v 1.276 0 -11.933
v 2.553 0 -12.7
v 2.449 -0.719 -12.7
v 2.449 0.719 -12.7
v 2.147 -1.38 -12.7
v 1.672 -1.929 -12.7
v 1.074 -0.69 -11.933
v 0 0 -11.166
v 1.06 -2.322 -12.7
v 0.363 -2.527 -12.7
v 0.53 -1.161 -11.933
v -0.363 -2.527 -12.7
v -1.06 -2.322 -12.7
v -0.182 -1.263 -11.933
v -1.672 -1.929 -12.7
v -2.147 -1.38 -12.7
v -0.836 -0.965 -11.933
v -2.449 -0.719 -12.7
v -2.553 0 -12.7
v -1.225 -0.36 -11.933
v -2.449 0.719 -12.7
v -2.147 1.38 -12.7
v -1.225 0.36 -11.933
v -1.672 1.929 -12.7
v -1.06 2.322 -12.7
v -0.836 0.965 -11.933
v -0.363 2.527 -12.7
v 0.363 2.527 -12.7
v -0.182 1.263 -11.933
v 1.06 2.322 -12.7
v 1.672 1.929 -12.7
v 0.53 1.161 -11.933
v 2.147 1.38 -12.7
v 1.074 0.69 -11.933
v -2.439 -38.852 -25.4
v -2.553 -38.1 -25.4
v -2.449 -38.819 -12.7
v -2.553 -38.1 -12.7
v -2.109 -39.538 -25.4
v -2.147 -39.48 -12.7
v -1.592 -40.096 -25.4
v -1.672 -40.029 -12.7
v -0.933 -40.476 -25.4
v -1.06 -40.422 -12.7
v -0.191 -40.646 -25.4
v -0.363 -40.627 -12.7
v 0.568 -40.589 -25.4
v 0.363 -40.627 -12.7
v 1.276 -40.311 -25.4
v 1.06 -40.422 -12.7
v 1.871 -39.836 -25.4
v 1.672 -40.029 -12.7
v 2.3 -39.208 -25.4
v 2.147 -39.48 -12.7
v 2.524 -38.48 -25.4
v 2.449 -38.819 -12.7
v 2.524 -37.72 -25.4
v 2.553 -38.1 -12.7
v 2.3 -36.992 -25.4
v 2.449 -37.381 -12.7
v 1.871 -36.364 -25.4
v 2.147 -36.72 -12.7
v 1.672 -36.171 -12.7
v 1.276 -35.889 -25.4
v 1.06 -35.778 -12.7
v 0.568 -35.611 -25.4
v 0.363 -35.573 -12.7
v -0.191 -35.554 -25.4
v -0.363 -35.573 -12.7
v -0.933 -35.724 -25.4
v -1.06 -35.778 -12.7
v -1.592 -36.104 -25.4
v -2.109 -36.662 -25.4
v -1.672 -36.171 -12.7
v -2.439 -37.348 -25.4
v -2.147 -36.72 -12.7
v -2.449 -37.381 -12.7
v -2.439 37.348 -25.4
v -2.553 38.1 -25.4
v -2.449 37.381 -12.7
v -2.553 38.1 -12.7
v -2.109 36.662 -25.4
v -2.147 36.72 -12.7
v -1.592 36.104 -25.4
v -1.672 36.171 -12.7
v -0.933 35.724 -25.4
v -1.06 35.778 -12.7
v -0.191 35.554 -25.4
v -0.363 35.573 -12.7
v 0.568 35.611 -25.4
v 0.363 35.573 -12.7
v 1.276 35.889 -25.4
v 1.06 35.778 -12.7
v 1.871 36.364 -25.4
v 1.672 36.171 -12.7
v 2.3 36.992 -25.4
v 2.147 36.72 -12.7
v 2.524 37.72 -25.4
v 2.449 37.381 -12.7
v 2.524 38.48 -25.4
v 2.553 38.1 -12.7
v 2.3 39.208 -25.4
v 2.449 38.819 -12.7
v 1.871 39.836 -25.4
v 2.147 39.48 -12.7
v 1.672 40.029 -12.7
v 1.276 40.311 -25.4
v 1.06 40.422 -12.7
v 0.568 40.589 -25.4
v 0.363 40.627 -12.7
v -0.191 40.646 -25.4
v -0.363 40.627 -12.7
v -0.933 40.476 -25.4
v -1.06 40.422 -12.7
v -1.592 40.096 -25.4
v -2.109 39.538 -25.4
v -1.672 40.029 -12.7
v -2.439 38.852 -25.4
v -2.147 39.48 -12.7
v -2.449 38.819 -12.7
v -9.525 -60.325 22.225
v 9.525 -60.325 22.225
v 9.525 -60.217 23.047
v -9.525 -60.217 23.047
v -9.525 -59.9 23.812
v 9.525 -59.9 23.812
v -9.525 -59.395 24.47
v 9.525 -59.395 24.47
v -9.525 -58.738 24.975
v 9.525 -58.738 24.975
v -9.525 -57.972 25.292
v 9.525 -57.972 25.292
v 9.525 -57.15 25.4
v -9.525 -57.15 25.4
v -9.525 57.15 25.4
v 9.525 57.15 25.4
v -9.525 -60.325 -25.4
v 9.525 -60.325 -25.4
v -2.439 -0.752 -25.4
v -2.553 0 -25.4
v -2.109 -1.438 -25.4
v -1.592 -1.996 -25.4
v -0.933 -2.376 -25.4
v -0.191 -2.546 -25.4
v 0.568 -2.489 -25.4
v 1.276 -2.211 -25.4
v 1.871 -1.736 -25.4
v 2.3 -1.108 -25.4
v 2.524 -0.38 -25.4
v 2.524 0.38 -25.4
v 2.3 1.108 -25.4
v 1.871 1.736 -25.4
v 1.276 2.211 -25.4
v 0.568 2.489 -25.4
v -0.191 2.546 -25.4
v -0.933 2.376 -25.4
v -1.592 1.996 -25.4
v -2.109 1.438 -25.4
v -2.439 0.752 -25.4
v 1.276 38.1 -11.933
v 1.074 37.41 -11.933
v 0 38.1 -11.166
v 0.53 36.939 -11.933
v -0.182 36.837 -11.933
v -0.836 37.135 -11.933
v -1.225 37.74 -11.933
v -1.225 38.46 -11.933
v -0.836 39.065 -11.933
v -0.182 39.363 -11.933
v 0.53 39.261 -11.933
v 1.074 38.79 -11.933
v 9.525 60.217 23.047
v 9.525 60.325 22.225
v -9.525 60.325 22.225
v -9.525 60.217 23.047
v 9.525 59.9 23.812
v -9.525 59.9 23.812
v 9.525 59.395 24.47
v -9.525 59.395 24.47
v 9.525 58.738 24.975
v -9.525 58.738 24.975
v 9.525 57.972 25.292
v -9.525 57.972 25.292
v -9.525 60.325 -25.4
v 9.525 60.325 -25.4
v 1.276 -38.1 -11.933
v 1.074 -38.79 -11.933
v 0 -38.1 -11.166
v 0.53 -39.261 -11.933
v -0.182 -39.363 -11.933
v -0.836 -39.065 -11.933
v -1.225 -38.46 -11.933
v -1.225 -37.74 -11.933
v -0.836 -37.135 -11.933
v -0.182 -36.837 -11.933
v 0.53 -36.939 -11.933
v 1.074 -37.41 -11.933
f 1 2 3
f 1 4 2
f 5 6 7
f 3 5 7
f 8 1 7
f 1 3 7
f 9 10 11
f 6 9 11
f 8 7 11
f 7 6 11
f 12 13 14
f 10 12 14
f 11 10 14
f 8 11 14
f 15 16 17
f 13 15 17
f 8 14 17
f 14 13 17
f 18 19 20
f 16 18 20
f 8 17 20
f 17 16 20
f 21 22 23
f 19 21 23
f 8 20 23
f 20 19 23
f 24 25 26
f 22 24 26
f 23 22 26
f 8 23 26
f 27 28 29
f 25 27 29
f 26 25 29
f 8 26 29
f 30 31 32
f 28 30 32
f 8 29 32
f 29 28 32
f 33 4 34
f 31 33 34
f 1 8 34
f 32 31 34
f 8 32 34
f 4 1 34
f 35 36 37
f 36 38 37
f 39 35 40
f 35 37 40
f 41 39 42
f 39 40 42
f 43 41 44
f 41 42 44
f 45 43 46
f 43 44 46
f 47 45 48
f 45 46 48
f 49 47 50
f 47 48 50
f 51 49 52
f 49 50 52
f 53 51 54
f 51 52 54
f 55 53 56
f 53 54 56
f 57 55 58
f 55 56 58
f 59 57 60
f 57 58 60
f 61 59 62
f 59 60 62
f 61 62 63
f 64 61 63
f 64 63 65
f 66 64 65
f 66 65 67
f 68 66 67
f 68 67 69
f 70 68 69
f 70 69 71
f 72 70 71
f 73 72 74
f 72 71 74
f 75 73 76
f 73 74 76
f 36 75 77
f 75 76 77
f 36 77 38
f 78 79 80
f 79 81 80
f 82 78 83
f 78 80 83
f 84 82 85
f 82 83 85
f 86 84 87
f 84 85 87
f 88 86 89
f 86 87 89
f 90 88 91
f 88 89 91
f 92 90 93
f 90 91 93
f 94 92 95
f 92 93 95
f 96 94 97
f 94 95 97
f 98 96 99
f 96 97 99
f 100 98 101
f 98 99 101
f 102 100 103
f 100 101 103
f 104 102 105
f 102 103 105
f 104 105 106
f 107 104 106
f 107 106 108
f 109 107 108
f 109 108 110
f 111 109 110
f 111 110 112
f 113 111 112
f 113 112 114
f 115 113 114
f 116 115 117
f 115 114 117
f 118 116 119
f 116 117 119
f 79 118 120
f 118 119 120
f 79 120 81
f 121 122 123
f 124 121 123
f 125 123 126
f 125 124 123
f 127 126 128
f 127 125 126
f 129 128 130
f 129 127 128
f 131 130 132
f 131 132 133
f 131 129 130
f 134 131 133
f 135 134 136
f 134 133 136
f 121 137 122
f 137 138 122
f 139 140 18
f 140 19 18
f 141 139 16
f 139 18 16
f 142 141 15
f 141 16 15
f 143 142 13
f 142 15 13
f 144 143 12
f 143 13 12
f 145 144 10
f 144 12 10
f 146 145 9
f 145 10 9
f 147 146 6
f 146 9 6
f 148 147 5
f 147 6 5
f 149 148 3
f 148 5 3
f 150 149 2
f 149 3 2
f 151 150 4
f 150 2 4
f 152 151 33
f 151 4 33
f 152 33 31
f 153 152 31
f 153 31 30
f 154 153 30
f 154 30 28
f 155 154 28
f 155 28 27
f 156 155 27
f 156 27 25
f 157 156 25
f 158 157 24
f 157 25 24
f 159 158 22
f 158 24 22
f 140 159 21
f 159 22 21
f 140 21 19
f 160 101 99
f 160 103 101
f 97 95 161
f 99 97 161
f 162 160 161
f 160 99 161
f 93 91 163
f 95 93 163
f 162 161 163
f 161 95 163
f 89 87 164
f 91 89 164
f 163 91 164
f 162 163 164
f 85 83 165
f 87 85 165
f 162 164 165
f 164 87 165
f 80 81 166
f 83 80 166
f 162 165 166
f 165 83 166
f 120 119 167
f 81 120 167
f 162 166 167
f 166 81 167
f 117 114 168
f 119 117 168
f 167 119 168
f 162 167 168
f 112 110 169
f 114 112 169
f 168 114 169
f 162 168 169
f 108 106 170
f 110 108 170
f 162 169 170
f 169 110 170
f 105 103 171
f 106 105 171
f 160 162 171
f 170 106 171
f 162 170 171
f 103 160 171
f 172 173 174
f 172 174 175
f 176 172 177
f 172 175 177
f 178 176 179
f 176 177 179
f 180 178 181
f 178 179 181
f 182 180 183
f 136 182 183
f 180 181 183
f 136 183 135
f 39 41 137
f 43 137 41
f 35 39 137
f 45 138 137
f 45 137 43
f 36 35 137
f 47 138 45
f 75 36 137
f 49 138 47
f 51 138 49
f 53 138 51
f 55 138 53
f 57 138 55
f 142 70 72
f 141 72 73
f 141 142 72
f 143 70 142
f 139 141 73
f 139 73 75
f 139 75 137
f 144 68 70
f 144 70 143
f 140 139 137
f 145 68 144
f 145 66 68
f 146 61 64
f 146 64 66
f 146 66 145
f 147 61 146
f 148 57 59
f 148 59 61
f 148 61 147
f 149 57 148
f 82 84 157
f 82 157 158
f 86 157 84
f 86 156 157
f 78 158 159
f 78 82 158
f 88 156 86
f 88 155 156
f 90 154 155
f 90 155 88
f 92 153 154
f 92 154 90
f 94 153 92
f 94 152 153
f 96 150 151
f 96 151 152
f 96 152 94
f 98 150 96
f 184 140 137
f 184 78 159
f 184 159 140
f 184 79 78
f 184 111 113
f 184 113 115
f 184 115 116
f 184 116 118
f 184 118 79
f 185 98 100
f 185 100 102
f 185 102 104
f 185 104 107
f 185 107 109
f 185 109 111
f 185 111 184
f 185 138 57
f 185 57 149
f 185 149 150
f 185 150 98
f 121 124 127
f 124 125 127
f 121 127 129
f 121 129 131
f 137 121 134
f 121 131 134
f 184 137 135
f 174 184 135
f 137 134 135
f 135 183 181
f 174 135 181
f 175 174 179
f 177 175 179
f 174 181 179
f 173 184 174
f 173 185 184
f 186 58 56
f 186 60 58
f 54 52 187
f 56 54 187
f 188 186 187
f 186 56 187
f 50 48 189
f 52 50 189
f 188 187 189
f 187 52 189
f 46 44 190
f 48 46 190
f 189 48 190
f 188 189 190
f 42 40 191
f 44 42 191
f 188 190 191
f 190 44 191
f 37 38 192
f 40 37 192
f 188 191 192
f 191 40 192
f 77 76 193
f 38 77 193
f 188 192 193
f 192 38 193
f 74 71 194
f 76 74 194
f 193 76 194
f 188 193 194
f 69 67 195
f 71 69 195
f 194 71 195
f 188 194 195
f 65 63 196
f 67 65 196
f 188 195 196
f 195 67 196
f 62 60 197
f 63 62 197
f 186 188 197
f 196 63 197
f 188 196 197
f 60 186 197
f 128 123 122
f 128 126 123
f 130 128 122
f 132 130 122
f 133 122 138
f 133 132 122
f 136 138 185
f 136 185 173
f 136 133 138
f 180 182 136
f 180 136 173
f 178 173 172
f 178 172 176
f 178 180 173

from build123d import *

# Parameters (mm, degrees)
F0_W     = 120.65
F0_H     = 50.8
F1_DEPTH = 9.525
F2_R     = 3.175
F4_D     = 5.1054
F4_DEPTH = 12.7
F4_TIP   = 1.5338169022


with BuildPart() as f1:
    # F0 (on Right) → F1 (new body, symmetric)
    with BuildSketch(Plane.YZ):
        Rectangle(F0_W, F0_H)
    extrude(amount=F1_DEPTH, both=True)

    # F2
    f2_edges = [f1.edges().sort_by_distance(p)[0] for p in [
        (0, -60.325, 25.4),
        (0, 60.325, 25.4),
    ]]
    fillet(f2_edges, radius=F2_R)

    # F4
    with Locations(Plane(origin=(0, 0, -25.4), x_dir=(1, 0, 0), z_dir=(0, 0, -1))):
        with Locations((0, 38.1), (0, 0), (0, -38.1)):
            Hole(F4_D / 2, depth=F4_DEPTH)
            with Locations((0, 0, -(F4_DEPTH + F4_TIP / 2))):  # 118° drill point
                Cone(0, F4_D / 2, F4_TIP, mode=Mode.SUBTRACT)


solid = f1.part
